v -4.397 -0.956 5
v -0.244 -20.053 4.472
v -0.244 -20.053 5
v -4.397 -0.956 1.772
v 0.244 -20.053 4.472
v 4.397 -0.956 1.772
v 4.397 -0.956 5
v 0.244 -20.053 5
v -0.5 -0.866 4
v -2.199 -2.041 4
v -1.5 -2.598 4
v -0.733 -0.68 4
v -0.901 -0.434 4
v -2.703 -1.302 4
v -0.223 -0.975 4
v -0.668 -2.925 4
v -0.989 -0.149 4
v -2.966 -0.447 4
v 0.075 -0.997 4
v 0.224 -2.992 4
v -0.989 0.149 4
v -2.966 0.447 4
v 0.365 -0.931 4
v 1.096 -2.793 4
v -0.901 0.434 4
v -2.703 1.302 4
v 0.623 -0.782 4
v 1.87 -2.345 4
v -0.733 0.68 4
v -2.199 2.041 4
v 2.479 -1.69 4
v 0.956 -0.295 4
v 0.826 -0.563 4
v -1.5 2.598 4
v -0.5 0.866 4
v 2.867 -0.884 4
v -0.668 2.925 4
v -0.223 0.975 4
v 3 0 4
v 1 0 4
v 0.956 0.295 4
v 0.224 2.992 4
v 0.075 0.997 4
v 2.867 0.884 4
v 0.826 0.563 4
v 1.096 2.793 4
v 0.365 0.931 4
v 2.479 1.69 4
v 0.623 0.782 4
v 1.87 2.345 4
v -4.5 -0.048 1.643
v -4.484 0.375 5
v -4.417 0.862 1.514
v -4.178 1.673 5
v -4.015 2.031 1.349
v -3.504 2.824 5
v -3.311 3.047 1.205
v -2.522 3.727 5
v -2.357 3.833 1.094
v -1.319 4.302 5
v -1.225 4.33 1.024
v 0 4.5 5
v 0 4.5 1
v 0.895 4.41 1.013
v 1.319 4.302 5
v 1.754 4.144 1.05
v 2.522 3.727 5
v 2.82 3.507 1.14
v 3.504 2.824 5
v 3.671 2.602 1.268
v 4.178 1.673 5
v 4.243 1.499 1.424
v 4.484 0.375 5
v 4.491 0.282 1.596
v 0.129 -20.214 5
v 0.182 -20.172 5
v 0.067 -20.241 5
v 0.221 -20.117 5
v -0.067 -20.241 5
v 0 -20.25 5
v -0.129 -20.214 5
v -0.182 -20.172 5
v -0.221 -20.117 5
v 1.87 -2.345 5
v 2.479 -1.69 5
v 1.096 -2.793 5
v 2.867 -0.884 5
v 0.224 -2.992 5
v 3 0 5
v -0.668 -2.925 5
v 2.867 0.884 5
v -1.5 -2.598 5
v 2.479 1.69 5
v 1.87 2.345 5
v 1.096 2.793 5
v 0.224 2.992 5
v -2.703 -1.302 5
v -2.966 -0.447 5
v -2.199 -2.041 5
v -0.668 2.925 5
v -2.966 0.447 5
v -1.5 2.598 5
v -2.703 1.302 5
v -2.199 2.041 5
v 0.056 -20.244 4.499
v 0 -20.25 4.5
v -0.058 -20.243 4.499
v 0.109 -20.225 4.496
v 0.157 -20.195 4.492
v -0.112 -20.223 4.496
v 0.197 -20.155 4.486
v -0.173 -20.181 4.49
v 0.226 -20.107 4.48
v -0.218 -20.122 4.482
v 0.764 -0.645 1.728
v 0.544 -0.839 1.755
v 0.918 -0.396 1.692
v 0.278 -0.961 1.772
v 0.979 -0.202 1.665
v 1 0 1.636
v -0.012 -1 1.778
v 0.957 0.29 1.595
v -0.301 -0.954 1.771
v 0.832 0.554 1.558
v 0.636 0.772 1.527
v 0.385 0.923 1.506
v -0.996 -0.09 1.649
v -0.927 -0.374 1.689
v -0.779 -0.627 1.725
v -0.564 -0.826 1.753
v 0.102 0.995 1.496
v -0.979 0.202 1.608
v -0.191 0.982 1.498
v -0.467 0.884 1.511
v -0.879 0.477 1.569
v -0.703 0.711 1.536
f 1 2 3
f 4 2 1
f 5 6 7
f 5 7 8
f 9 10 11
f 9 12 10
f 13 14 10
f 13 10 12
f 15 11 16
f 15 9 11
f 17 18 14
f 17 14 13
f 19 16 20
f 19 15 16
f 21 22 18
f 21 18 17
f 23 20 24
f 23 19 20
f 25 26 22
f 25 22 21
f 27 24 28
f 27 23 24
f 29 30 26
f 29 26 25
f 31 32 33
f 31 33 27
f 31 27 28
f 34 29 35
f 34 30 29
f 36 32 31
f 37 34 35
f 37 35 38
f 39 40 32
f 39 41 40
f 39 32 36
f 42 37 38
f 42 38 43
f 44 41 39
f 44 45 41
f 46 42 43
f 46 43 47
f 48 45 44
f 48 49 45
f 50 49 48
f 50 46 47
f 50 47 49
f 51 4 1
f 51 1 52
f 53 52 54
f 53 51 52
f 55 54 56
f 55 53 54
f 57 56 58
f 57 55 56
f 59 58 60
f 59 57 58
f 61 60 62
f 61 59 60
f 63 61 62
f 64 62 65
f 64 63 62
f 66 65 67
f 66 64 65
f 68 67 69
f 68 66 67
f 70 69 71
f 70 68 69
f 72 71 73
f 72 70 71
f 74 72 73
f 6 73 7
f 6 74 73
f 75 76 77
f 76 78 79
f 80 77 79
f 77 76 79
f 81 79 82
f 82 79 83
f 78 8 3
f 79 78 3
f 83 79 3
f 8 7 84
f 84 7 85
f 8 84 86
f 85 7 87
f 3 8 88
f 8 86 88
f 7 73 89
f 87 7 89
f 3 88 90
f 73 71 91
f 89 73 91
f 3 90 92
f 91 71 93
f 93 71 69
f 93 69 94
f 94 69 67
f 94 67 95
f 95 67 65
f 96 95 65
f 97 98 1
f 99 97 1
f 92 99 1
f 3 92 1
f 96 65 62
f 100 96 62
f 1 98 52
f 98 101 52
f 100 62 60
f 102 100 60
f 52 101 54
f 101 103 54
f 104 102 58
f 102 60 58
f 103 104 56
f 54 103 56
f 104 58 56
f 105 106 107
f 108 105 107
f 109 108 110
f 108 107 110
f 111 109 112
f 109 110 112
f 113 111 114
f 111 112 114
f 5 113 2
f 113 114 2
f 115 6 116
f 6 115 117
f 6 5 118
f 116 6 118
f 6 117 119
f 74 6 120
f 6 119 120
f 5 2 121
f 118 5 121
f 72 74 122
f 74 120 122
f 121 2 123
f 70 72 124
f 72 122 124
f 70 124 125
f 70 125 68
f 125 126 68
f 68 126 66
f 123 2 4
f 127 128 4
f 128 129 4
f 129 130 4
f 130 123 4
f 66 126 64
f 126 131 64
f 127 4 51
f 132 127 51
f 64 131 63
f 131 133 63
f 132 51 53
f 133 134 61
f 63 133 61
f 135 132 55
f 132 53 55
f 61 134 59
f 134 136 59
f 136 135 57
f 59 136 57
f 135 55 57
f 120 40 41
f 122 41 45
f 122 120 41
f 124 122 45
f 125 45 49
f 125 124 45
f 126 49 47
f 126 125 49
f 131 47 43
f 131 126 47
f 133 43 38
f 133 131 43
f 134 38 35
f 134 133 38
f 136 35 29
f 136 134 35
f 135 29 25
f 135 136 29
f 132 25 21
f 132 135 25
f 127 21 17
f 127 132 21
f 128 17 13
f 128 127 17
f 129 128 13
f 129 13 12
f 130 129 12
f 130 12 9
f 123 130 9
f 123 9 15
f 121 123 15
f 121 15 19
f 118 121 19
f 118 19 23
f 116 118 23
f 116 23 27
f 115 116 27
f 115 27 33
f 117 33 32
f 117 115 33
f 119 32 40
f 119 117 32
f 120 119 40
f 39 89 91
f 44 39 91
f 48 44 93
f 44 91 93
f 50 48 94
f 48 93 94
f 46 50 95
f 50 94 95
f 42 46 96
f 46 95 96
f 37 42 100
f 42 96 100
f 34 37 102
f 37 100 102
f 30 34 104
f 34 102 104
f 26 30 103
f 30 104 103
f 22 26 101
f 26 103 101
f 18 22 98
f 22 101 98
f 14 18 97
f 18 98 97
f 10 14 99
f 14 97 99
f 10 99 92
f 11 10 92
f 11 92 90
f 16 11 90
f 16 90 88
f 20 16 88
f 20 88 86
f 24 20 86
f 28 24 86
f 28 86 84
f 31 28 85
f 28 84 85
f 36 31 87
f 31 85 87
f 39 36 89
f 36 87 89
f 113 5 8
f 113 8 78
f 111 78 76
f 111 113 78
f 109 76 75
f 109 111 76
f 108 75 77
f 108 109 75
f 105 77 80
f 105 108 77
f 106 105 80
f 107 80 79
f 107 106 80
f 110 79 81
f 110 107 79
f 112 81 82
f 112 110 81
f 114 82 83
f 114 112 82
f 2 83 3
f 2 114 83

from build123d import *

# Parameters (mm, degrees)
ESBO_O1_R                  = 1
RESSALTO_EXTRUS_O1_DEPTH   = 5
CORTE_EXTRUS_O1_DEPTH      = 5
CORTE_EXTRUS_O1_DEPTH_BACK = 5
ESBO_O3_R                  = 3
CORTE_EXTRUS_O2_DEPTH      = 1


with BuildPart() as part:
    # Esboço1 → Ressalto-extrusão1 (new body)
    with BuildSketch(Plane.XY):
        with BuildLine():
            Line((4.3972248, -0.95625), (0.244290267, -20.053125))
            ThreePointArc((0.244290267, -20.053125), (0, -20.25), (-0.244290267, -20.053125))
            Line((-0.244290267, -20.053125), (-4.3972248, -0.95625))
            ThreePointArc((-4.3972248, -0.95625), (0, 4.5), (4.3972248, -0.95625))
        make_face()
        Circle(ESBO_O1_R, mode=Mode.SUBTRACT)
    extrude(amount=RESSALTO_EXTRUS_O1_DEPTH)

    # Esboço2 → Corte-extrusão1 (cut, two sides: drawn at the far end of the back side and taken through both)
    with BuildSketch(Plane(origin=(0, 0, 0), x_dir=(0, 0, -1), z_dir=(1, 0, 0)).offset(-CORTE_EXTRUS_O1_DEPTH_BACK)):
        Polygon((0, 4.5), (0, -20.25), (-4.5, -20.25), (-1, 4.5), align=None)
    extrude(amount=CORTE_EXTRUS_O1_DEPTH + CORTE_EXTRUS_O1_DEPTH_BACK, mode=Mode.SUBTRACT)

    # Esboço3 → Corte-extrusão2 (cut)
    with BuildSketch(Plane.XY.offset(5)):
        Circle(ESBO_O3_R)
    extrude(amount=-CORTE_EXTRUS_O2_DEPTH, mode=Mode.SUBTRACT)


solid = part.part
